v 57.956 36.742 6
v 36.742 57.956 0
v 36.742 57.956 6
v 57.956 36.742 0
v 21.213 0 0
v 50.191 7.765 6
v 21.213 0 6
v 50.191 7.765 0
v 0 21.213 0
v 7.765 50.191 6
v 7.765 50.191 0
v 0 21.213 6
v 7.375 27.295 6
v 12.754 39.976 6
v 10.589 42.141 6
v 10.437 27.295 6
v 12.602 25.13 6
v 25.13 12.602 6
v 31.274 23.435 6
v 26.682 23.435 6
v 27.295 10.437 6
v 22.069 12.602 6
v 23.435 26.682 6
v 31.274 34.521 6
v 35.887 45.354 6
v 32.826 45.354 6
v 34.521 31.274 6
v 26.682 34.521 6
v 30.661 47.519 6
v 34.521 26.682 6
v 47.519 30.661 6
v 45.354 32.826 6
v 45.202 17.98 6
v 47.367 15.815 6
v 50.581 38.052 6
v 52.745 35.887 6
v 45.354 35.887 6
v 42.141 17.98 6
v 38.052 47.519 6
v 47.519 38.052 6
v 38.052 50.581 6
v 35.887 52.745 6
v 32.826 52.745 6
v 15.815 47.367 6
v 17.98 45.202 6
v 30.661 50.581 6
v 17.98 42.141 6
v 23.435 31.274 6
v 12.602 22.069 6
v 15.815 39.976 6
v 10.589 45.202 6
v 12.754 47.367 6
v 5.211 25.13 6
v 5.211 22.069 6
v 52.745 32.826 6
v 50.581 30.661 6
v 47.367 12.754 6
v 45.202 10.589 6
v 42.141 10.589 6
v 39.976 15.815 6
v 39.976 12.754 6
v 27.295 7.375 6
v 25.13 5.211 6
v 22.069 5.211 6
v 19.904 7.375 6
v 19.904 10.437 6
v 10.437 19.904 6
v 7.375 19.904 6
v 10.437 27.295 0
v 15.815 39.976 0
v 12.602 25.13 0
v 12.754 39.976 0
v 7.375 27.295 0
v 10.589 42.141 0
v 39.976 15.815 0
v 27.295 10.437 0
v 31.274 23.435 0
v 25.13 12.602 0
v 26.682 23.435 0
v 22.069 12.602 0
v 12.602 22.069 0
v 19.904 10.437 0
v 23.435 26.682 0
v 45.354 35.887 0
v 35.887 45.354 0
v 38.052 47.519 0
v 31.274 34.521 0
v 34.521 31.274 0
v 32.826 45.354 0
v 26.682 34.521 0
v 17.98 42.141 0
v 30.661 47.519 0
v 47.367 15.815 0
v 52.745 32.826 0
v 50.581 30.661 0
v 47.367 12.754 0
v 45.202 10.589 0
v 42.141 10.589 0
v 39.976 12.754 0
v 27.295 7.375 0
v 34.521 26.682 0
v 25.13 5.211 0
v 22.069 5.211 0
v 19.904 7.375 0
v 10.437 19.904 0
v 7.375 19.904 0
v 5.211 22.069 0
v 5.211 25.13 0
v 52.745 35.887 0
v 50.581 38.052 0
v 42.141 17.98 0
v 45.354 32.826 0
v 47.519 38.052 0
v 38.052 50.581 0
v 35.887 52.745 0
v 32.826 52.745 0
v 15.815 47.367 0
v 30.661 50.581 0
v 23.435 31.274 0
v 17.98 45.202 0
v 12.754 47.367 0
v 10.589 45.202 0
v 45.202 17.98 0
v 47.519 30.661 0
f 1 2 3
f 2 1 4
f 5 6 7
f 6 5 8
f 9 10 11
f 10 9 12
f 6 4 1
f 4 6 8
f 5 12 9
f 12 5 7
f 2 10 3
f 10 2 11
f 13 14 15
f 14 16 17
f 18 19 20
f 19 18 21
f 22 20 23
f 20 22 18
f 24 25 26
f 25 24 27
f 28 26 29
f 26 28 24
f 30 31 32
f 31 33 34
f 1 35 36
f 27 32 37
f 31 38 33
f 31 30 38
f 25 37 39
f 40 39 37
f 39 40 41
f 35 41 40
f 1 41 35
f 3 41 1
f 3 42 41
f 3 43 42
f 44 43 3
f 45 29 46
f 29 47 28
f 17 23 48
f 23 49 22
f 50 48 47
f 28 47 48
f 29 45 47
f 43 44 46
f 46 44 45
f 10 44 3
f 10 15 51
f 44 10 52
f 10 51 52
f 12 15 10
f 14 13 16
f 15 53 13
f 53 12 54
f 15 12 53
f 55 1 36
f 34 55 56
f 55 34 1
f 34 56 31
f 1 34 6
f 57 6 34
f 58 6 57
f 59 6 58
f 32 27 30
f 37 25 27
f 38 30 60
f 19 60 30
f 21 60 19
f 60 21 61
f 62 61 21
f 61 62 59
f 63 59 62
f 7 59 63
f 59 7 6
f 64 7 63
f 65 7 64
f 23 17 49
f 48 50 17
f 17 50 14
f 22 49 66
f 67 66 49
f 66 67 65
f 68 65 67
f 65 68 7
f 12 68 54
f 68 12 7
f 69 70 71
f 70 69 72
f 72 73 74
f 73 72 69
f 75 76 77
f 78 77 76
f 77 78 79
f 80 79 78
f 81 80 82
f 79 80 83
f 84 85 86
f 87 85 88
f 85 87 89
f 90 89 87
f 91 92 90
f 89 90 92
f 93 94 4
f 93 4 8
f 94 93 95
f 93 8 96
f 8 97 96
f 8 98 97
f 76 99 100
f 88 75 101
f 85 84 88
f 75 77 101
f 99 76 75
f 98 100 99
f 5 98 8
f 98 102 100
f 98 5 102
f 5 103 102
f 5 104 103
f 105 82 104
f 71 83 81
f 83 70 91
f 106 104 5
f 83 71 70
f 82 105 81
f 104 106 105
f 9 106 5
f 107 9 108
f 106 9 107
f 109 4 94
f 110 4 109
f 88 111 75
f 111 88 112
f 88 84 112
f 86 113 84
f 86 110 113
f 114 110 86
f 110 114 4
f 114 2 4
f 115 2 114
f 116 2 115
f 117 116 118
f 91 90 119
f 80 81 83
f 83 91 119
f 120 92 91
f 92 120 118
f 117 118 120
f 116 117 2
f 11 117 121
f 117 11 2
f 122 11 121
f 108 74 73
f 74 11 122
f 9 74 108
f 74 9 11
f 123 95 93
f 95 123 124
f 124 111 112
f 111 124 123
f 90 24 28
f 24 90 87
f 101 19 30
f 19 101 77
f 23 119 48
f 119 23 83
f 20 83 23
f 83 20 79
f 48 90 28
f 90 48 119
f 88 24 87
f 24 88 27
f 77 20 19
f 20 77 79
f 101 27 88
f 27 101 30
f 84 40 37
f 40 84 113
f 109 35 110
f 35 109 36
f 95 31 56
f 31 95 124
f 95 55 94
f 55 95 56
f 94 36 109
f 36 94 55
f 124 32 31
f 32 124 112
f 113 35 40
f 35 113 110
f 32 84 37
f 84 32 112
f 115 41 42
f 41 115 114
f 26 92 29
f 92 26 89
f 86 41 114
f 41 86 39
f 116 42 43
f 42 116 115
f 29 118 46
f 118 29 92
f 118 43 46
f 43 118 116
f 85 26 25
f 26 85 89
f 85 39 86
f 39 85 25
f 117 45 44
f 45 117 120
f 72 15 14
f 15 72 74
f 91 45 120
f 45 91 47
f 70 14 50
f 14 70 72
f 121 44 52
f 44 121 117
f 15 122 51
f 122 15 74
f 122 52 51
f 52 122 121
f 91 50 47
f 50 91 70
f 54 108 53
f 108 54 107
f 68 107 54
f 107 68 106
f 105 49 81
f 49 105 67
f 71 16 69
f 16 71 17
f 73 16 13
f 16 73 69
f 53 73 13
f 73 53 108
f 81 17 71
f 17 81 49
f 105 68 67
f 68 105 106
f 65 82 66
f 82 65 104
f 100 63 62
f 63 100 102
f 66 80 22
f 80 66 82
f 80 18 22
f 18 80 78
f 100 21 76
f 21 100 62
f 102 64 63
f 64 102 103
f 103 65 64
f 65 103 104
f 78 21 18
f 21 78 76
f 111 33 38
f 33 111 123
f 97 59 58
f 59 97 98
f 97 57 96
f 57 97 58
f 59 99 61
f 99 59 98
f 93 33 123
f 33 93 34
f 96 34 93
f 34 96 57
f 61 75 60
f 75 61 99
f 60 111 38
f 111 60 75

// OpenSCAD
$fn = 32;

// ----------------------------------------------------------------------
// Polygon plate: 6-gon R30, 6 bolt windows
// ----------------------------------------------------------------------

// --- parameters (mm) ---
sides = 6;                // number of polygon sides
plate_r = 30;             // circumscribed radius of the polygon
bore_r = 6;               // centre bore radius
bolts = 6;                // number of bolt windows
ring_r = 20.78;           // bolt-circle radius
bolt_r = 4;               // bolt window radius
plate_t = 6;              // plate thickness, Z (extrusion height)

plate_d = 2 * plate_r;  // circumscribed diameter
bore_d = 2 * bore_r;  // centre bore diameter
bolt_d = 2 * bolt_r;  // bolt window diameter
ring_d = 2 * ring_r;  // bolt-circle diameter

profile = [[57.956, 36.742], [36.742, 57.956], [7.765, 50.191], [0, 21.213], [21.213, 0], [50.191, 7.765]];  // primary outline, 6 points, counter clockwise
void_1 = [[34.521, 31.274], [31.274, 34.521], [26.682, 34.521], [23.435, 31.274], [23.435, 26.682], [26.682, 23.435], [31.274, 23.435], [34.521, 26.682]];  // centre bore, 8 points
void_2 = [[52.745, 35.887], [50.581, 38.052], [47.519, 38.052], [45.354, 35.887], [45.354, 32.826], [47.519, 30.661], [50.581, 30.661], [52.745, 32.826]];  // bolt window 1, 8 points
void_3 = [[38.052, 50.581], [35.887, 52.745], [32.826, 52.745], [30.661, 50.581], [30.661, 47.519], [32.826, 45.354], [35.887, 45.354], [38.052, 47.519]];  // bolt window 2, 8 points
void_4 = [[17.98, 45.202], [15.815, 47.367], [12.754, 47.367], [10.589, 45.202], [10.589, 42.141], [12.754, 39.976], [15.815, 39.976], [17.98, 42.141]];  // bolt window 3, 8 points
void_5 = [[12.602, 25.13], [10.437, 27.295], [7.375, 27.295], [5.211, 25.13], [5.211, 22.069], [7.375, 19.904], [10.437, 19.904], [12.602, 22.069]];  // bolt window 4, 8 points
void_6 = [[27.295, 10.437], [25.13, 12.602], [22.069, 12.602], [19.904, 10.437], [19.904, 7.375], [22.069, 5.211], [25.13, 5.211], [27.295, 7.375]];  // bolt window 5, 8 points
void_7 = [[47.367, 15.815], [45.202, 17.98], [42.141, 17.98], [39.976, 15.815], [39.976, 12.754], [42.141, 10.589], [45.202, 10.589], [47.367, 12.754]];  // bolt window 6, 8 points

// --- the one profile operation ---
difference() {
  linear_extrude(height = plate_t) polygon(points = profile);
  translate([0, 0, -1])
    linear_extrude(height = plate_t + 2) polygon(points = void_1);
  translate([0, 0, -1])
    linear_extrude(height = plate_t + 2) polygon(points = void_2);
  translate([0, 0, -1])
    linear_extrude(height = plate_t + 2) polygon(points = void_3);
  translate([0, 0, -1])
    linear_extrude(height = plate_t + 2) polygon(points = void_4);
  translate([0, 0, -1])
    linear_extrude(height = plate_t + 2) polygon(points = void_5);
  translate([0, 0, -1])
    linear_extrude(height = plate_t + 2) polygon(points = void_6);
  translate([0, 0, -1])
    linear_extrude(height = plate_t + 2) polygon(points = void_7);
}
